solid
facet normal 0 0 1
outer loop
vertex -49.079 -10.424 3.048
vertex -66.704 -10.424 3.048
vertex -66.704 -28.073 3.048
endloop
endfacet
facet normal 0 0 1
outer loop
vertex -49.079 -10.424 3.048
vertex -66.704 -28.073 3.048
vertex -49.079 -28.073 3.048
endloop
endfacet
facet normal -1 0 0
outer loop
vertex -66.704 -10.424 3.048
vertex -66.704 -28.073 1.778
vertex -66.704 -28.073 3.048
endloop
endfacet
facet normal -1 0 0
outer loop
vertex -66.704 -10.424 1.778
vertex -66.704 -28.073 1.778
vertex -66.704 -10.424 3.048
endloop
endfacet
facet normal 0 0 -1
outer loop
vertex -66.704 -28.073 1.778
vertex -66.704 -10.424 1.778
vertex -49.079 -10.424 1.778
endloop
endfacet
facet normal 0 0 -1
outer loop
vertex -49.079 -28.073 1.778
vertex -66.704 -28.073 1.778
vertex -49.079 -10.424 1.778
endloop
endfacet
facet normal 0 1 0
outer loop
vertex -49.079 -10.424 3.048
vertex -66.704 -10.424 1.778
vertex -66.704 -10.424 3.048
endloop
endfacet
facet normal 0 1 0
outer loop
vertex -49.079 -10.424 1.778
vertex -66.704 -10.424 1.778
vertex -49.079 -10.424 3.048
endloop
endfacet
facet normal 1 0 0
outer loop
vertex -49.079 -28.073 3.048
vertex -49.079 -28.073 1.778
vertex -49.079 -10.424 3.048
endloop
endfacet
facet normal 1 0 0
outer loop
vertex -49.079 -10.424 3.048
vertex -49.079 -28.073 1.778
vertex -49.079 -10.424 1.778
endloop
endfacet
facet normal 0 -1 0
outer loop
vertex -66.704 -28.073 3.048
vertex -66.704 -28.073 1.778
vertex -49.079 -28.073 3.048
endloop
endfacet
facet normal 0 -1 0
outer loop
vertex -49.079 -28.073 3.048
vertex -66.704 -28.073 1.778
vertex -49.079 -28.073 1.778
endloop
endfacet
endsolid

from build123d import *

# Parameters (mm, degrees)
F0_W     = 76.029807
F0_H     = 76.111034
F1_DEPTH = 1.778
F2_W     = 17.624621
F2_H     = 17.648534
F3_DEPTH = 1.27


with BuildPart() as f1:
    # F0 (on Top) → F1 (new body)
    with BuildSketch(Plane.XY):
        with Locations((-38.014903, 38.055517)):
            Rectangle(F0_W, F0_H)
    extrude(amount=F1_DEPTH)


with BuildPart() as f3:
    # F2 (on face) → F3 (new body)
    with BuildSketch(Plane.XY.offset(1.778)):
        with Locations((-57.89136, -19.248753)):
            Rectangle(F2_W, F2_H)
    extrude(amount=F3_DEPTH)


solid = f3.part
